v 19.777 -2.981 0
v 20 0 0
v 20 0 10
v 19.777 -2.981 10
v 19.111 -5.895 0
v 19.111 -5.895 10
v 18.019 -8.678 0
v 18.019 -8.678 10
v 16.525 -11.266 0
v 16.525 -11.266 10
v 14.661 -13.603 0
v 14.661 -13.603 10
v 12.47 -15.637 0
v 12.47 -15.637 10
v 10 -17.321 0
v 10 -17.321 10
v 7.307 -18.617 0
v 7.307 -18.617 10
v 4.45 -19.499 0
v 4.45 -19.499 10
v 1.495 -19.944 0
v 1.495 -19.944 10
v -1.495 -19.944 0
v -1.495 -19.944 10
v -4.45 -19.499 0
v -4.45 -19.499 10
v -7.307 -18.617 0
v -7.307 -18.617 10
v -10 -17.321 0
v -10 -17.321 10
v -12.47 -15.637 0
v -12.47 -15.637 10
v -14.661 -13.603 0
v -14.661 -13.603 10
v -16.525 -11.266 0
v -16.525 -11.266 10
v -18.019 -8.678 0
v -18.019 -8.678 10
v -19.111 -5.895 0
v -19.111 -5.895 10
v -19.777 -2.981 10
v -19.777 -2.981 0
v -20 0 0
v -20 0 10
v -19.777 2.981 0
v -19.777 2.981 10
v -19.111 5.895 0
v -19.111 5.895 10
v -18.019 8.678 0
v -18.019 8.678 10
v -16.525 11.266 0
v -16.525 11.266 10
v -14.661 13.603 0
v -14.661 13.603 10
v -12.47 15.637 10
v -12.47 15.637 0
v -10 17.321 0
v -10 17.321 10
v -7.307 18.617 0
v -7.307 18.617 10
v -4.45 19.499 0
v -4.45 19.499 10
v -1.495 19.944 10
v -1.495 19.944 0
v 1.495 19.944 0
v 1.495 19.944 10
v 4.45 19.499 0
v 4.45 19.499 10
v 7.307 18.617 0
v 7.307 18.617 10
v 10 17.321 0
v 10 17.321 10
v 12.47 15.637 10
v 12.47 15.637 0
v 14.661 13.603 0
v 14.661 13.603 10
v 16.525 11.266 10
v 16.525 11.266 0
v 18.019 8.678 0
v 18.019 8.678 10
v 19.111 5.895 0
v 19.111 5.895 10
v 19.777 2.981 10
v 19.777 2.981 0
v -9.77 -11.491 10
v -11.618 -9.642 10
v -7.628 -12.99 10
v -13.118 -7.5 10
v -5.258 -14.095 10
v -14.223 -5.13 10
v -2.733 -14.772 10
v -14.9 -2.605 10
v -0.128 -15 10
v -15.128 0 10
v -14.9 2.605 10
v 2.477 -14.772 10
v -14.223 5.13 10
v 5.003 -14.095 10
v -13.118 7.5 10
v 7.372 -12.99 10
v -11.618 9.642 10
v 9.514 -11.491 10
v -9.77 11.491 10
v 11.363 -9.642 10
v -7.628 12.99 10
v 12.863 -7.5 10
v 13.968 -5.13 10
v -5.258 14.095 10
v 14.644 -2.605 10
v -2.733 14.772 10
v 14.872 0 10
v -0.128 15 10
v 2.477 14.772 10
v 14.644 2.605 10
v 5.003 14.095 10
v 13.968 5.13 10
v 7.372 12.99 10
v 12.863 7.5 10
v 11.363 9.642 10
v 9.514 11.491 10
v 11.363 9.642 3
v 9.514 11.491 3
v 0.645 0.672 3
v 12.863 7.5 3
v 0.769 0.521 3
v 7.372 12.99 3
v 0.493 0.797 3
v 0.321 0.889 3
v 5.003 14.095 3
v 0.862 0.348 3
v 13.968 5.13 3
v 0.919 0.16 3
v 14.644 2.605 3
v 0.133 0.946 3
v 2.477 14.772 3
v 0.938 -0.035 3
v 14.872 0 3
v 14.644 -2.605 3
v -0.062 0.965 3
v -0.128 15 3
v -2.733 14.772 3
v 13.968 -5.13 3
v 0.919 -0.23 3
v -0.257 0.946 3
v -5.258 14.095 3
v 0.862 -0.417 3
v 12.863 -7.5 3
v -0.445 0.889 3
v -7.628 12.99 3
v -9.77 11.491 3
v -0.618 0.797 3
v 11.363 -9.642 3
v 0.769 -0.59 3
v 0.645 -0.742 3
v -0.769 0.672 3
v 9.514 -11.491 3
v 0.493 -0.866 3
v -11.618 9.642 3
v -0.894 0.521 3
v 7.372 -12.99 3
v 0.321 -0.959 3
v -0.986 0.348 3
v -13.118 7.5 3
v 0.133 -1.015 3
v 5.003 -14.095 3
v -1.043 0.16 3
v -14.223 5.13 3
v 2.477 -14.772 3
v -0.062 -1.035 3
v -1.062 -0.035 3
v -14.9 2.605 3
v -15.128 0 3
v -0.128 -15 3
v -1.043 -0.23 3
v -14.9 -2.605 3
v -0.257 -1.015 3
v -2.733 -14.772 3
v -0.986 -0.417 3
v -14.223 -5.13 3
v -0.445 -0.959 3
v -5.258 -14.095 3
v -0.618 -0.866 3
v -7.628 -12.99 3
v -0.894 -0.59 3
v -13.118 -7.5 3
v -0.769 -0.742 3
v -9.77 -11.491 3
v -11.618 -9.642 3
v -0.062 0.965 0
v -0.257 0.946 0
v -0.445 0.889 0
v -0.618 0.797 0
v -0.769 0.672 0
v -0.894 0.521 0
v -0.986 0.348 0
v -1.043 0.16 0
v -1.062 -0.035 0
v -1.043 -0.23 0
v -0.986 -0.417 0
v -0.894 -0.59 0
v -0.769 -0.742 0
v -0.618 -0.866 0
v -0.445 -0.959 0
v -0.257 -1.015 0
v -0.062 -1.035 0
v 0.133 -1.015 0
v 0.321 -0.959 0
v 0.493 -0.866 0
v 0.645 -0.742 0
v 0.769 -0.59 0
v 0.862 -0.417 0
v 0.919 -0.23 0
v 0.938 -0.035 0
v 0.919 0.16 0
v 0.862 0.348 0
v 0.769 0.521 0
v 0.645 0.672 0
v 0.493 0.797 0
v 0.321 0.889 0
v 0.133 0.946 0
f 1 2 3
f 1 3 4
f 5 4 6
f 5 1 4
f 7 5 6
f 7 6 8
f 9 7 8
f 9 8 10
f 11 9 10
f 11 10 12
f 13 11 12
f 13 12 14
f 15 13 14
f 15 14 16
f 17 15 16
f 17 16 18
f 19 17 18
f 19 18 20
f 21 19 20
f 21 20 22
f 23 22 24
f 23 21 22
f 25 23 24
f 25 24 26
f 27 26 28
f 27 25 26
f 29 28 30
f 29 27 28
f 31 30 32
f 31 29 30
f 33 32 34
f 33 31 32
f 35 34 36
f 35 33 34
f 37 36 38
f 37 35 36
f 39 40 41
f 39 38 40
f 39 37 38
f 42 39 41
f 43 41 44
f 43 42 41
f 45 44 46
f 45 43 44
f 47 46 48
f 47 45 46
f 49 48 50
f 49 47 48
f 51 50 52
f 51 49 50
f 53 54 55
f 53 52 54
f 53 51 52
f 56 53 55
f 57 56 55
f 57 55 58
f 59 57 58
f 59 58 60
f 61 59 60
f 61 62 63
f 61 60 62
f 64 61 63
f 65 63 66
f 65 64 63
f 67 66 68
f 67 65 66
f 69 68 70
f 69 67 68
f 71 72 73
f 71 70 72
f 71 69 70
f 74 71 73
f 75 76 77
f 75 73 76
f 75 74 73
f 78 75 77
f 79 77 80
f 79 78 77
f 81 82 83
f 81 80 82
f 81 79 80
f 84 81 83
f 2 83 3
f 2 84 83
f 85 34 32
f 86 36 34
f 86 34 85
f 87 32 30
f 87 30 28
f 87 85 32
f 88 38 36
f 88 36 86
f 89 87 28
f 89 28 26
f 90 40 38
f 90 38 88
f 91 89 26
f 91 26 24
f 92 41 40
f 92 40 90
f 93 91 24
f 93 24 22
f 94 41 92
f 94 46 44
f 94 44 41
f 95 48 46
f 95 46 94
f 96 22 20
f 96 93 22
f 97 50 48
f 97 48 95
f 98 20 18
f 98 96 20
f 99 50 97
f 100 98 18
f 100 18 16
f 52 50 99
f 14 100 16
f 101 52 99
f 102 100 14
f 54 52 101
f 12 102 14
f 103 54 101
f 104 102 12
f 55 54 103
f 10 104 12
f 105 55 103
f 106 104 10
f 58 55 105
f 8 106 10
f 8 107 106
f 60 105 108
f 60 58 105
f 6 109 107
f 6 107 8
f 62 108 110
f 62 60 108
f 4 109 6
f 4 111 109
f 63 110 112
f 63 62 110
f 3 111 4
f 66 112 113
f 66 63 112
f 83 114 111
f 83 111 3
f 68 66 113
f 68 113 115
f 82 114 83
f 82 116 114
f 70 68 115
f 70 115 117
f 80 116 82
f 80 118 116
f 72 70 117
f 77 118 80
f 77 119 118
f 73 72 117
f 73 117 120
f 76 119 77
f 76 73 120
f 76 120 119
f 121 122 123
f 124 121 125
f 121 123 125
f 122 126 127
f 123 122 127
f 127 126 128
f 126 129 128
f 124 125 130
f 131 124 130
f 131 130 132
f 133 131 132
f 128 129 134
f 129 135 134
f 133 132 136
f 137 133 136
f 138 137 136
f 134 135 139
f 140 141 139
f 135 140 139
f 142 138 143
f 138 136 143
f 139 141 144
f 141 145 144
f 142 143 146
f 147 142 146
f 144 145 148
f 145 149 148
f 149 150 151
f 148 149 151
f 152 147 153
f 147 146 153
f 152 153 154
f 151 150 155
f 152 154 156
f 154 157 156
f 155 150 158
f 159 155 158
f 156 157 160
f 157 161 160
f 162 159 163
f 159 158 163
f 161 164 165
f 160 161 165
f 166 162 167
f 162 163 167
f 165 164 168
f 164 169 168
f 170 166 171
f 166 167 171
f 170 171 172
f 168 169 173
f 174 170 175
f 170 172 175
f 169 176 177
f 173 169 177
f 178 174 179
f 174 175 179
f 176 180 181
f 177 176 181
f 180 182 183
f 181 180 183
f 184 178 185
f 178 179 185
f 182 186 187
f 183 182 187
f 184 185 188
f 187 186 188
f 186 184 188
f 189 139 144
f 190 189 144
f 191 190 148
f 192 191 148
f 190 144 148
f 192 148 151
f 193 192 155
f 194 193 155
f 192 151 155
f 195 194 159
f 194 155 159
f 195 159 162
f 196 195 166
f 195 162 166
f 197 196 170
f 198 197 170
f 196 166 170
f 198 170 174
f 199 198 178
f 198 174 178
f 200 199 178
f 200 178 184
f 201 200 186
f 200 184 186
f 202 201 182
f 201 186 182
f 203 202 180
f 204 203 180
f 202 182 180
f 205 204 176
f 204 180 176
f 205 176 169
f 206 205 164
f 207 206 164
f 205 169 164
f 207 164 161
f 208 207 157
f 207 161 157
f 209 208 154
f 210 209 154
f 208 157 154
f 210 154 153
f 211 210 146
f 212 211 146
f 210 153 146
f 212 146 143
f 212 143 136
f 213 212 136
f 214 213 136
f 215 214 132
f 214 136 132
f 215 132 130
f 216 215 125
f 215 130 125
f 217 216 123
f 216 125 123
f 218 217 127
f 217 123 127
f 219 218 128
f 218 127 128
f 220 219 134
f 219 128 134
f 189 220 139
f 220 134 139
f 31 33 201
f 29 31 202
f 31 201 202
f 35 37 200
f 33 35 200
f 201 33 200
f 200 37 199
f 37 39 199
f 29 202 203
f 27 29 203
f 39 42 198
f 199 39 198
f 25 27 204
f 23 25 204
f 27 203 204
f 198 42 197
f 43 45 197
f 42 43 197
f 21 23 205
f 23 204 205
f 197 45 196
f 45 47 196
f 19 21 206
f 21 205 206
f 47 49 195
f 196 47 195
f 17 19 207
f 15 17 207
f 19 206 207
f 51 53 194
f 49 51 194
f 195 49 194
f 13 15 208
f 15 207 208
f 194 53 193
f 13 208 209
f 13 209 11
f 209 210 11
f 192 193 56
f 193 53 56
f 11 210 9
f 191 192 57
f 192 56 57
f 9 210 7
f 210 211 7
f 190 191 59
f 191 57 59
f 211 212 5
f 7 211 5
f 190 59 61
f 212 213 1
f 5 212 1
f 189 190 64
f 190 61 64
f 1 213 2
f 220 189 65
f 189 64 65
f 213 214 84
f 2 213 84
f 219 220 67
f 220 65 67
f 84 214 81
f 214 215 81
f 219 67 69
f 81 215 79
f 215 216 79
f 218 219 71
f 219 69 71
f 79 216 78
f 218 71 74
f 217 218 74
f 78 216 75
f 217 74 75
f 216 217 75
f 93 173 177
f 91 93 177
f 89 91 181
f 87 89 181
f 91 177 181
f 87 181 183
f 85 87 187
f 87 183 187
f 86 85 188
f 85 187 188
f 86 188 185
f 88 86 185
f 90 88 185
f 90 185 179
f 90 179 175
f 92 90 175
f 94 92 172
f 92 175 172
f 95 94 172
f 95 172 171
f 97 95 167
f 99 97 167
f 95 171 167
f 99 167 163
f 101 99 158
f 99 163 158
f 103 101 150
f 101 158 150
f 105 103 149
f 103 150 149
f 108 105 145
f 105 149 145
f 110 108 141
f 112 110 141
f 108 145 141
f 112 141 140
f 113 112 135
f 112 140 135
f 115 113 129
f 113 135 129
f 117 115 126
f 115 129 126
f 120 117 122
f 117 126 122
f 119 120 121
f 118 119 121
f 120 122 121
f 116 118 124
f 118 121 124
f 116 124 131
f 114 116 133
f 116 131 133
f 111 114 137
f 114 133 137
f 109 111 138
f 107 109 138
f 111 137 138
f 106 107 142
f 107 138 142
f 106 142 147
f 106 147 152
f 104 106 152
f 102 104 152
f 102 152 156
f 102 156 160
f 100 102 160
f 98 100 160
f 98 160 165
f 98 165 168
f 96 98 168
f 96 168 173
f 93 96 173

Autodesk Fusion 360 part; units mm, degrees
sketch "Sketch1" plane through (0, 0, 0) normal (0, 0, 1) x (1, 0, 0)
  circle A0 centre (0, 0) radius 20
extrude "Extrude1" add sketch "Sketch1" along normal blind 10
hole "Hole1" at (-0.1278, 0, 10) direction (0, 0, -1) diameter 30 depth 7 tip angle 180
hole "Hole2" at (-0.0621, -0.0347, 0) direction (0, 0, 1) diameter 2 depth 7 tip angle 180
